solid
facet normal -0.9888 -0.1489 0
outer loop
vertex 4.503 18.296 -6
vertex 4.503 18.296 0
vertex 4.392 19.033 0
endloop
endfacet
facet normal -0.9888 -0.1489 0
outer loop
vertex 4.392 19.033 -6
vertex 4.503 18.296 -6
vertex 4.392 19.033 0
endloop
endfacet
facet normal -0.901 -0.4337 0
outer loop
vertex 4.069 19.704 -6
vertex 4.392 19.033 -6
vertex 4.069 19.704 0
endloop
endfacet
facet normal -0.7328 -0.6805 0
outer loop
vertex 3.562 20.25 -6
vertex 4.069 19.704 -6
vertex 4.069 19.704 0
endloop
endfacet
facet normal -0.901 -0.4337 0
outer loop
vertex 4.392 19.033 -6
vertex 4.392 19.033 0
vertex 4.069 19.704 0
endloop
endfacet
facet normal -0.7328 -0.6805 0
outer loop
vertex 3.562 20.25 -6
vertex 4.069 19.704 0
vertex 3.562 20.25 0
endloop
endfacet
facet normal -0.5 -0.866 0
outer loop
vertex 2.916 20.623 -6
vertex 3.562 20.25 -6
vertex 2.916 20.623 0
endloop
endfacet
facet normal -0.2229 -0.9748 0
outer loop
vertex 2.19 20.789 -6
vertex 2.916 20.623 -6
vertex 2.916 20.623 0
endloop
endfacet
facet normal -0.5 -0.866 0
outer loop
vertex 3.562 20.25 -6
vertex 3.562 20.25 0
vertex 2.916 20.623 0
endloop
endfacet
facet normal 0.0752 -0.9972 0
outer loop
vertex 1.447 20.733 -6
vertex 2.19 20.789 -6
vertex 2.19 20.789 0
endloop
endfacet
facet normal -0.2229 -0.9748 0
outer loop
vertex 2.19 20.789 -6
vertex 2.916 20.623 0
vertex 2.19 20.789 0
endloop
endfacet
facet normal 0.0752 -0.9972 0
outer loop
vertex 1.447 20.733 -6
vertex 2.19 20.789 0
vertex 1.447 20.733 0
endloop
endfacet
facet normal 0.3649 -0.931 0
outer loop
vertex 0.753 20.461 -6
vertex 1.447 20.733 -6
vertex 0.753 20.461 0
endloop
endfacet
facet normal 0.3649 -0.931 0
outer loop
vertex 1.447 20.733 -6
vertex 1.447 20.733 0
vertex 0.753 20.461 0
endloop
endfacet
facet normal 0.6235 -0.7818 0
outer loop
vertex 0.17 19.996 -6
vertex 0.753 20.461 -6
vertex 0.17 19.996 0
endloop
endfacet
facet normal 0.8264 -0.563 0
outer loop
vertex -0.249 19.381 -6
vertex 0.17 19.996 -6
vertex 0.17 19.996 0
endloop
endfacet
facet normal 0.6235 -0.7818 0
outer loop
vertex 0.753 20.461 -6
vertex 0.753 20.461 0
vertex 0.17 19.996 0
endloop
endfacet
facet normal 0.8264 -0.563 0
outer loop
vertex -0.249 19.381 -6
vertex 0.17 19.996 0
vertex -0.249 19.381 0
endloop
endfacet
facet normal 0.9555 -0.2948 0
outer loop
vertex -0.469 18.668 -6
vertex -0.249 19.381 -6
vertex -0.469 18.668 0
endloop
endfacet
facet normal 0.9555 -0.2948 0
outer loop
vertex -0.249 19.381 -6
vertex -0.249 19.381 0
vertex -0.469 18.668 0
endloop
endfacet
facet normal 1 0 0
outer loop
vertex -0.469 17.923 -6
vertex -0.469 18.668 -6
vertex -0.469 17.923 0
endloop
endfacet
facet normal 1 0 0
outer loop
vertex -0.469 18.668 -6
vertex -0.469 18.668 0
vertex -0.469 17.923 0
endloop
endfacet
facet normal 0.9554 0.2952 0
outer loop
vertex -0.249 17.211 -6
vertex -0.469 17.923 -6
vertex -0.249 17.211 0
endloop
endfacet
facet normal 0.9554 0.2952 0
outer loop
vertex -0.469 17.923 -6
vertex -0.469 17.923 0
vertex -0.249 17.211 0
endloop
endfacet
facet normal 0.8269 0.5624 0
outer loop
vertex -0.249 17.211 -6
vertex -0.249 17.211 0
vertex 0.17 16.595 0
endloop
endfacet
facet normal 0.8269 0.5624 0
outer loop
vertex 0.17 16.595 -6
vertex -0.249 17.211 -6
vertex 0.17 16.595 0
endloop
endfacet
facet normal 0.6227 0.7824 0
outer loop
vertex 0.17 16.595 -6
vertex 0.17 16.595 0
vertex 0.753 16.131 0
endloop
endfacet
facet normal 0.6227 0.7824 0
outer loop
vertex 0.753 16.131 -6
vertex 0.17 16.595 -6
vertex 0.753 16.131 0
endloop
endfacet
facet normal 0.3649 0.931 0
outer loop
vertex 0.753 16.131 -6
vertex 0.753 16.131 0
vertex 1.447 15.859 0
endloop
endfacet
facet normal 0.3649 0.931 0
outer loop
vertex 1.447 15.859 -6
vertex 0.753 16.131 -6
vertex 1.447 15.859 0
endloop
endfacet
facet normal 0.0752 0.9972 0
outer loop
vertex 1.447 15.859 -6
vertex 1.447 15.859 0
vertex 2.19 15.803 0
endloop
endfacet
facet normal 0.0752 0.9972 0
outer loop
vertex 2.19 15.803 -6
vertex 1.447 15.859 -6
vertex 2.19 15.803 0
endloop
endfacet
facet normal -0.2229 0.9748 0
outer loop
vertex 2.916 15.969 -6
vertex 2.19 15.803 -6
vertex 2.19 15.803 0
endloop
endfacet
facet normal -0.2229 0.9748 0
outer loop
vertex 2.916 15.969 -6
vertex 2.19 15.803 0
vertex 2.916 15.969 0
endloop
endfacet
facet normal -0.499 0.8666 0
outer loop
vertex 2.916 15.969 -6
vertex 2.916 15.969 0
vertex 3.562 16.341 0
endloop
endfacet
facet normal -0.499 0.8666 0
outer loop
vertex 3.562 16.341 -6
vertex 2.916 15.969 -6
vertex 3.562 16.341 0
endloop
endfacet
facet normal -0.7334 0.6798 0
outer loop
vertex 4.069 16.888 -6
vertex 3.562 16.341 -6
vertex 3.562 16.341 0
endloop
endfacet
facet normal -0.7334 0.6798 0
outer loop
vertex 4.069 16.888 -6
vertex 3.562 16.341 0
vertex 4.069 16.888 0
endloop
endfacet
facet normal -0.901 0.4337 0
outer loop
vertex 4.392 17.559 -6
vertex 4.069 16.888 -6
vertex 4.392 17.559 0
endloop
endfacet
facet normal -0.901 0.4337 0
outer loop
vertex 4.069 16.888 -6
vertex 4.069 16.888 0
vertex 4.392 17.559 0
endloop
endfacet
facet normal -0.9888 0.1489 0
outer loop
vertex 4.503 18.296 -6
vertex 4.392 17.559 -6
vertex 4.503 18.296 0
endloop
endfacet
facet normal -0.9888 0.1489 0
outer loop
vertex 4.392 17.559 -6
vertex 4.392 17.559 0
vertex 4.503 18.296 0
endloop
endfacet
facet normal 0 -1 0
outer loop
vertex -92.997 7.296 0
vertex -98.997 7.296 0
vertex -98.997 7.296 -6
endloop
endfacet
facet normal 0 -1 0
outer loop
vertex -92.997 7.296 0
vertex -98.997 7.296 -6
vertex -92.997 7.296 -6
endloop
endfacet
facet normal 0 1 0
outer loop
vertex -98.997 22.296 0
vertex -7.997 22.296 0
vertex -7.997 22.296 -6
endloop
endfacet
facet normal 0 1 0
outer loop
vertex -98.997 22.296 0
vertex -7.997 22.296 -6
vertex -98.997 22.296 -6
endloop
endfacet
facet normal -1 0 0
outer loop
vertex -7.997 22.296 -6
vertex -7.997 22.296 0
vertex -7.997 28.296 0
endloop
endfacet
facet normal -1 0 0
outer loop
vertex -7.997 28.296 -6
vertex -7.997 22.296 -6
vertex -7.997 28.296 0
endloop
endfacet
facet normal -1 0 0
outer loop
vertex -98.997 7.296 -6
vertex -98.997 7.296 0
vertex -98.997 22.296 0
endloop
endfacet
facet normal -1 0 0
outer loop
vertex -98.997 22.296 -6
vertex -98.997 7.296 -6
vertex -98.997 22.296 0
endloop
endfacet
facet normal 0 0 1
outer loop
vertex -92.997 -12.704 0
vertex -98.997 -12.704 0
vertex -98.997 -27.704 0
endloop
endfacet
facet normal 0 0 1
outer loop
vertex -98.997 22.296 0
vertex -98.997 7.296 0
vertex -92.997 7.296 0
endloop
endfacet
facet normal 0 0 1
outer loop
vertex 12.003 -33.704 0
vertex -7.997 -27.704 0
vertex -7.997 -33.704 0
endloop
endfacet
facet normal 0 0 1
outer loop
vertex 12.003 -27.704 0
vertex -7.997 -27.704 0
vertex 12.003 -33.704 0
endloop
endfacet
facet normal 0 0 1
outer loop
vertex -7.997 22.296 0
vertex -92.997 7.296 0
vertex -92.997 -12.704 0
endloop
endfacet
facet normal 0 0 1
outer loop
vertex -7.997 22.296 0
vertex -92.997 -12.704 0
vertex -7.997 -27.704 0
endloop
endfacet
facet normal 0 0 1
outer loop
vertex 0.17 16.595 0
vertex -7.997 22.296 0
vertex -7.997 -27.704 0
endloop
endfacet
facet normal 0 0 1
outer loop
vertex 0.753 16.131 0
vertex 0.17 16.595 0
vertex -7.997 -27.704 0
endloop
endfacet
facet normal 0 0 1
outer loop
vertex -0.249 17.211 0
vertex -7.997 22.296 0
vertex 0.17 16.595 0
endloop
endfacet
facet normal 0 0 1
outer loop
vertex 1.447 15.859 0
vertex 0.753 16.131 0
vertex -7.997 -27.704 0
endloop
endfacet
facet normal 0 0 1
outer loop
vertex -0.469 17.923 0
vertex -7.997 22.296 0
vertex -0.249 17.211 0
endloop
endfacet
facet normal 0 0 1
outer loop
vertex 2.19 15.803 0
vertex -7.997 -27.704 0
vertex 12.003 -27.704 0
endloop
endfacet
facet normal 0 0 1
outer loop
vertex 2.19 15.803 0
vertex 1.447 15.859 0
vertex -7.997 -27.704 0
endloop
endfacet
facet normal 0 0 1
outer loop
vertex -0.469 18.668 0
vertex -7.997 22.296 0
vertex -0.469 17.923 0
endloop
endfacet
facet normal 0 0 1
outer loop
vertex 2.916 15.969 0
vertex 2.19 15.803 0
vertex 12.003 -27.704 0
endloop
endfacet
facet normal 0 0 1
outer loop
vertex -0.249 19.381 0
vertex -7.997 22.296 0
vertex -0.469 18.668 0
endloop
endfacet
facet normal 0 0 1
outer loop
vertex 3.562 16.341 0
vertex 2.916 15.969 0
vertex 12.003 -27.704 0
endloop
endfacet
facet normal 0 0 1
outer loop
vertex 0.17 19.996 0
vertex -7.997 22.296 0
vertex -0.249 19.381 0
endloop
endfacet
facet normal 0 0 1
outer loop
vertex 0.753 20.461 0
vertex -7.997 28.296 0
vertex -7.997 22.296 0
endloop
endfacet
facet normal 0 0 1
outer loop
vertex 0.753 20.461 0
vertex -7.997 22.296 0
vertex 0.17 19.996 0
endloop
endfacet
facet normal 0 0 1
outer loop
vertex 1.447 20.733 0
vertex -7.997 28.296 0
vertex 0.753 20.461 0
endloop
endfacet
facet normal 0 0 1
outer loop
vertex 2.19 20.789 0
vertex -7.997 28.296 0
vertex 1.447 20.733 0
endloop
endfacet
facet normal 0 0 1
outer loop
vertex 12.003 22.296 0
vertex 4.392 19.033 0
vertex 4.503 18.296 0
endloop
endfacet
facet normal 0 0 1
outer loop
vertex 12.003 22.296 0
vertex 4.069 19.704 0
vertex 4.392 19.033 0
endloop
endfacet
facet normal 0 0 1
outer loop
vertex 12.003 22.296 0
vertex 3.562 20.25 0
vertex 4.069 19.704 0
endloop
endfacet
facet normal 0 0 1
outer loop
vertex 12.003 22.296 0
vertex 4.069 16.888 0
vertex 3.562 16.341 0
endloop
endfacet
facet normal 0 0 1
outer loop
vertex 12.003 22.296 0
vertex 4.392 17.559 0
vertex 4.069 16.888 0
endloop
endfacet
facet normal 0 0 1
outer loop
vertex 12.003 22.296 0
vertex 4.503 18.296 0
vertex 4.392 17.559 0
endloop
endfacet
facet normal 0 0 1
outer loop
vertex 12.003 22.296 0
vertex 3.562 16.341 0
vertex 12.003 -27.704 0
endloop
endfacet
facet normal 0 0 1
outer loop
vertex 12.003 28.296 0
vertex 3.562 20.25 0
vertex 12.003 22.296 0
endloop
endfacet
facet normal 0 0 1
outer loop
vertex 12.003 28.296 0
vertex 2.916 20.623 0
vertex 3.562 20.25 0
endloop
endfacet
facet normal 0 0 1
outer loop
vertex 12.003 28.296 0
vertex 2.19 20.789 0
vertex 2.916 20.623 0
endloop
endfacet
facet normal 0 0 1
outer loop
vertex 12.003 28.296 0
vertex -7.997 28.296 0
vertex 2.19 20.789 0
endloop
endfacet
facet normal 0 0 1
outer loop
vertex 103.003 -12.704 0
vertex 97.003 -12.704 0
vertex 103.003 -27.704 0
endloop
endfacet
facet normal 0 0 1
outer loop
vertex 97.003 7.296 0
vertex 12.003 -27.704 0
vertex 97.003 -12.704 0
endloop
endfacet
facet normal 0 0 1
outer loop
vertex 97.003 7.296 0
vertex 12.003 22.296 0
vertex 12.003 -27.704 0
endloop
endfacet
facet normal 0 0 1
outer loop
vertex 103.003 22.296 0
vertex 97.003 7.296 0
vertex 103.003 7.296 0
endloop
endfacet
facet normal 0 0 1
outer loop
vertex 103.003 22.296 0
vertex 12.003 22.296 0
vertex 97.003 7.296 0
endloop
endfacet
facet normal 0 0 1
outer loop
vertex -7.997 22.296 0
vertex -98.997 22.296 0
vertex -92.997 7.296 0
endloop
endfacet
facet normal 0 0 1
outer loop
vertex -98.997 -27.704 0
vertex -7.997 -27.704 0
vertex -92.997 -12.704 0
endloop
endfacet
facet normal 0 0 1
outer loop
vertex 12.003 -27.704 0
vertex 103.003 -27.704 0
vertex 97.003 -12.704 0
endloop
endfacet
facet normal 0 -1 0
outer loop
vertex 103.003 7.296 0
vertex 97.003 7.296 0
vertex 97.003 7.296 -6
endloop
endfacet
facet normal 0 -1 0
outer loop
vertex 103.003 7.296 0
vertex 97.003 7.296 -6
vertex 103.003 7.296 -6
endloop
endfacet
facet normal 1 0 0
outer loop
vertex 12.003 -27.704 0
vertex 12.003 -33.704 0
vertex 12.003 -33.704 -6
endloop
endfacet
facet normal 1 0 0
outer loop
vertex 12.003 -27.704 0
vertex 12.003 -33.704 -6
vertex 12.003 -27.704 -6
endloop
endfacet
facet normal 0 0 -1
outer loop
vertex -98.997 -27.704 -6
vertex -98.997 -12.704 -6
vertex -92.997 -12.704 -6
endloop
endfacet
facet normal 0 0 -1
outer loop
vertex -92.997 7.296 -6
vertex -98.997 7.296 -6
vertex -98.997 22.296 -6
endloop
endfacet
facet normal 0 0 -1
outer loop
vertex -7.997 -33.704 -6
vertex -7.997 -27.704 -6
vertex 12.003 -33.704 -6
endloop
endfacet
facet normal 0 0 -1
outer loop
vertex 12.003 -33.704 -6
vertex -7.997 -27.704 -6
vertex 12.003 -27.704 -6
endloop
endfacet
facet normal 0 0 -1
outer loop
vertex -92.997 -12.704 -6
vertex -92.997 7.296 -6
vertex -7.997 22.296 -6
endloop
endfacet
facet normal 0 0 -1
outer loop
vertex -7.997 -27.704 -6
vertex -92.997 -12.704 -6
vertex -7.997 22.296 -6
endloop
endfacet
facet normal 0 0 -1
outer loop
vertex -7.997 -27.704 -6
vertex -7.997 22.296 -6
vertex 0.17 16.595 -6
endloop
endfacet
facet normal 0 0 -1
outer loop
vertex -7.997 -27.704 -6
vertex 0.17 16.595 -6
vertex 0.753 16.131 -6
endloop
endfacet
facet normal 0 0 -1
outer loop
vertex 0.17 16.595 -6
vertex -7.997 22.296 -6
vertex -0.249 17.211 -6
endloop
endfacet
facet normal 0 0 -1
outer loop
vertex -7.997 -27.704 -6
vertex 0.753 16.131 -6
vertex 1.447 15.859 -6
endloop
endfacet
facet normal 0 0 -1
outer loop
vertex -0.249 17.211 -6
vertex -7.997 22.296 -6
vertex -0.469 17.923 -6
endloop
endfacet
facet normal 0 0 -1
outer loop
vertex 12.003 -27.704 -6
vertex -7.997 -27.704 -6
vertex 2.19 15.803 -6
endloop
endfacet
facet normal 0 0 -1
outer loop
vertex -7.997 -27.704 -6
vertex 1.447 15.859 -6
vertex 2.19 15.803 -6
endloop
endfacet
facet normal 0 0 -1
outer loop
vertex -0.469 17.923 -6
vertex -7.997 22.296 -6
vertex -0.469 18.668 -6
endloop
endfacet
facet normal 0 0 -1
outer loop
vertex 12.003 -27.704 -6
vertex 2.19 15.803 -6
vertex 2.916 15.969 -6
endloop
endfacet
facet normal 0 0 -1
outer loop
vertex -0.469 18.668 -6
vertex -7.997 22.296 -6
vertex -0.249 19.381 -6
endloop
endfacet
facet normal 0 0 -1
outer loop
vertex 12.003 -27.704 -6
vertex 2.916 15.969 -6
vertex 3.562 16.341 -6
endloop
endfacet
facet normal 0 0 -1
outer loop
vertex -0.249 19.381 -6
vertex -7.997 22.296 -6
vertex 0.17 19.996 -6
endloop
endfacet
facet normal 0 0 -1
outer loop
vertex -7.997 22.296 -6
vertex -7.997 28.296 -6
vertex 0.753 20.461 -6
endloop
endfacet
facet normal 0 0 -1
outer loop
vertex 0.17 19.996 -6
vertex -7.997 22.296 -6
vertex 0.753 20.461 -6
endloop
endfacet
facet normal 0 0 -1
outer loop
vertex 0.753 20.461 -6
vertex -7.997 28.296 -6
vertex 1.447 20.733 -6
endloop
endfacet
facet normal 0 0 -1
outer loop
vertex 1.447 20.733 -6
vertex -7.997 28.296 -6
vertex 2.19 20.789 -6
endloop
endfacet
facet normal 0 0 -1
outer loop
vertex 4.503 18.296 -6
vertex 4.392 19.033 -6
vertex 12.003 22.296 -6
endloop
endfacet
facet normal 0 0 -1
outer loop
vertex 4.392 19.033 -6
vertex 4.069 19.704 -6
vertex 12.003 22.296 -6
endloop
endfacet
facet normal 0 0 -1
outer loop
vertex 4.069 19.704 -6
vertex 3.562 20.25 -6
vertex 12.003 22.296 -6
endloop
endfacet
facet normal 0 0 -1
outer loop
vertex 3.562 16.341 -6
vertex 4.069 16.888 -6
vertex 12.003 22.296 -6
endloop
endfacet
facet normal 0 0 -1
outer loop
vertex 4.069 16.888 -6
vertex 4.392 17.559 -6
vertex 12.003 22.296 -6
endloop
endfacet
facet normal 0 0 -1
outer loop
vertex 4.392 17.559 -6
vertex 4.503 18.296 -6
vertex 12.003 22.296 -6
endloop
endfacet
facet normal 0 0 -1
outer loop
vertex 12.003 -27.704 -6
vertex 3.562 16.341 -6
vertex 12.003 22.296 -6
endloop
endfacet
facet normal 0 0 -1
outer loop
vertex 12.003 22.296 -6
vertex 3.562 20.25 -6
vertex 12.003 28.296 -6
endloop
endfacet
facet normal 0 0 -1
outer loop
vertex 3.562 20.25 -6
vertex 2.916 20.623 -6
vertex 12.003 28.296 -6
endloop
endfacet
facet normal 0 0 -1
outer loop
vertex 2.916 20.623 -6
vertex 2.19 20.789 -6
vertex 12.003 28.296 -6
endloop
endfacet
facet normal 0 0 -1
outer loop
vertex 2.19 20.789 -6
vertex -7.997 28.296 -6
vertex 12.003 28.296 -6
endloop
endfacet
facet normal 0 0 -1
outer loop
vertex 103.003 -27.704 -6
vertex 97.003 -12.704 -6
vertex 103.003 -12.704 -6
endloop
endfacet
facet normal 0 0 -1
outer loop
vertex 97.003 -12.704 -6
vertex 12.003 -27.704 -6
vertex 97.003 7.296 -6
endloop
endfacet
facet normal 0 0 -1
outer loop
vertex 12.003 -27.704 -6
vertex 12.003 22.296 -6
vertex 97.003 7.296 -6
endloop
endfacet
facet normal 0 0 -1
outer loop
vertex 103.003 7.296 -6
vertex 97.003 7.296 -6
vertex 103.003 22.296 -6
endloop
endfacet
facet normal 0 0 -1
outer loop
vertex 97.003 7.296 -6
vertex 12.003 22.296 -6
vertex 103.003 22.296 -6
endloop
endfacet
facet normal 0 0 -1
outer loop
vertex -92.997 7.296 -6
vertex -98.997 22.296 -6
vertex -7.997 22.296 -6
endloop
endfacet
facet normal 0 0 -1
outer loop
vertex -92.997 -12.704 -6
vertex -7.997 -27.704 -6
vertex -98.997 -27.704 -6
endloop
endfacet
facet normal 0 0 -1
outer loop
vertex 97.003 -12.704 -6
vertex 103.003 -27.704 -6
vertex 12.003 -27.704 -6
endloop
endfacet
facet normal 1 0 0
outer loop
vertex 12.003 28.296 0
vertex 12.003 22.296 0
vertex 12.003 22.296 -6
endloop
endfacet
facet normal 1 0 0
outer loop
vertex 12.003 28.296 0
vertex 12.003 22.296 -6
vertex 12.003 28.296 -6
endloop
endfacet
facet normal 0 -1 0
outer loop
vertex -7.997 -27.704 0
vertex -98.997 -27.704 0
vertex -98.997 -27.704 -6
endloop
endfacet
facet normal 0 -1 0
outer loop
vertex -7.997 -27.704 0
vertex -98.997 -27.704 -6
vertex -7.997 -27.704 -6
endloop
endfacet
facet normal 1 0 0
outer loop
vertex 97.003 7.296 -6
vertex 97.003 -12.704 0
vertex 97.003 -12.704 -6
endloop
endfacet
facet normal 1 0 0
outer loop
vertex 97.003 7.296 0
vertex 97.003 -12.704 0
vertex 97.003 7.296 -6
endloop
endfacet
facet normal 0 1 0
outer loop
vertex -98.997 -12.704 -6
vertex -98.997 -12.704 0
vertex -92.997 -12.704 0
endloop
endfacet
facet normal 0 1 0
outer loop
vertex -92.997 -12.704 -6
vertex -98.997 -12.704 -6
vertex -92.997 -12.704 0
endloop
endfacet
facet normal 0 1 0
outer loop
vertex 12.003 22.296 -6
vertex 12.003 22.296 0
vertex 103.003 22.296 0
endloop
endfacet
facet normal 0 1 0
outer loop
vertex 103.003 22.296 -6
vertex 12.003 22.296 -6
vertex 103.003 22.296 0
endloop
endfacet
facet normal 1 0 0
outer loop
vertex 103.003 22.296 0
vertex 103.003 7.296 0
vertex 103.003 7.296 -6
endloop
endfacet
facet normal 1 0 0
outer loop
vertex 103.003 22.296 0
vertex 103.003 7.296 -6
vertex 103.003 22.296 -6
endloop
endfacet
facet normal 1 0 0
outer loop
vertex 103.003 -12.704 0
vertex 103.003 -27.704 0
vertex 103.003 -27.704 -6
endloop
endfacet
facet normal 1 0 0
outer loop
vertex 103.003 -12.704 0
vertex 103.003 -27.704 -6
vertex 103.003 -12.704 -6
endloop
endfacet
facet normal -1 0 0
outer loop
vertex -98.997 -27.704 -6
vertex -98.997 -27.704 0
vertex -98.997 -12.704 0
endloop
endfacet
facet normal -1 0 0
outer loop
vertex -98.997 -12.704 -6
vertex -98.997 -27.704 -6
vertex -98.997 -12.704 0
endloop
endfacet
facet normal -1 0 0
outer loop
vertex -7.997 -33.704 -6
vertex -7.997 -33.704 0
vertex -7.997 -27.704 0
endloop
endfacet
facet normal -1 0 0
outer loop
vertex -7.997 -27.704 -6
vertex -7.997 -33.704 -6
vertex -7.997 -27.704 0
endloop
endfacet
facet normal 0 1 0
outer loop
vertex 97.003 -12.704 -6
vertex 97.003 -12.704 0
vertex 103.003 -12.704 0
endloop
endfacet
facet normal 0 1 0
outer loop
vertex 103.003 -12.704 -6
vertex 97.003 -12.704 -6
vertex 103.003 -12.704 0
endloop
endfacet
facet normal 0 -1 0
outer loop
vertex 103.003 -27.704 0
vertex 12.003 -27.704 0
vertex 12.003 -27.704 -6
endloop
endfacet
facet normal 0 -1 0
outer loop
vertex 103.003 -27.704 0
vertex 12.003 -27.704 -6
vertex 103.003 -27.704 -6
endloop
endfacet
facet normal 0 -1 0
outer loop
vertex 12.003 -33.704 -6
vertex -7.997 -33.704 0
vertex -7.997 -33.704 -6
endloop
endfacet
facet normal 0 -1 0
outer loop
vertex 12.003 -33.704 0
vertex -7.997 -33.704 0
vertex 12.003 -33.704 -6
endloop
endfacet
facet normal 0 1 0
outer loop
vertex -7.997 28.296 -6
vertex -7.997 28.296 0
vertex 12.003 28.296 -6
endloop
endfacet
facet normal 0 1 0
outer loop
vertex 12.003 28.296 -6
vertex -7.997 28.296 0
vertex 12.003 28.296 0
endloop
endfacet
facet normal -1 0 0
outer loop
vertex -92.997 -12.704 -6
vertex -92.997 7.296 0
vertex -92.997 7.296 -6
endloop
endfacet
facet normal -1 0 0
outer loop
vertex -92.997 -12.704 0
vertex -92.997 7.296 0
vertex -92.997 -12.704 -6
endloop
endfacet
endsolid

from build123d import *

# Parameters (mm, degrees)
BOSS_EXTRU_2_DEPTH      = 6
ESQUISSE7_W             = 20
ESQUISSE7_H             = 6
ESQUISSE7_W_2           = 6
ESQUISSE7_H_2           = 15
BOSS_EXTRU_3_DEPTH      = 6
ESQUISSE8_R             = 2.5
ENL_V_MAT_EXTRU_2_DEPTH = 6


with BuildPart() as part:
    # Esquisse6 → Boss.-Extru.2 (new body)
    with BuildSketch(Plane.XY):
        Polygon((12.003078089, 22.295844579), (97.003078089, 22.295844579), (97.003078089, 7.295844579), (97.003078089, -12.704155421), (97.003078089, -27.704155421), (12.003078089, -27.704155421), (-7.996921911, -27.704155421), (-92.996921911, -27.704155421), (-92.996921911, -12.704155421), (-92.996921911, 7.295844579), (-92.996921911, 22.295844579), (-7.996921911, 22.295844579), align=None)
    extrude(amount=-BOSS_EXTRU_2_DEPTH)

    # Esquisse7 → Boss.-Extru.3 (add)
    with BuildSketch(Plane.XY):
        with Locations((2.003078089, 25.295844579)):
            Rectangle(ESQUISSE7_W, ESQUISSE7_H)
        with Locations((100.003078089, 14.795844579)):
            Rectangle(ESQUISSE7_W_2, ESQUISSE7_H_2)
        with Locations((100.003078089, -20.204155421)):
            Rectangle(ESQUISSE7_W_2, ESQUISSE7_H_2)
        with Locations((2.003078089, -30.704155421)):
            Rectangle(ESQUISSE7_W, ESQUISSE7_H)
        with Locations((-95.996921911, -20.204155421)):
            Rectangle(ESQUISSE7_W_2, ESQUISSE7_H_2)
        with Locations((-95.996921911, 14.795844579)):
            Rectangle(ESQUISSE7_W_2, ESQUISSE7_H_2)
    extrude(amount=-BOSS_EXTRU_3_DEPTH)

    # Esquisse8 → Enlèv. mat.-Extru.2 (cut)
    with BuildSketch(Plane.XY):
        with Locations((2.003078089, 18.295844579)):
            Circle(ESQUISSE8_R)
    extrude(amount=-ENL_V_MAT_EXTRU_2_DEPTH, mode=Mode.SUBTRACT)


solid = part.part
